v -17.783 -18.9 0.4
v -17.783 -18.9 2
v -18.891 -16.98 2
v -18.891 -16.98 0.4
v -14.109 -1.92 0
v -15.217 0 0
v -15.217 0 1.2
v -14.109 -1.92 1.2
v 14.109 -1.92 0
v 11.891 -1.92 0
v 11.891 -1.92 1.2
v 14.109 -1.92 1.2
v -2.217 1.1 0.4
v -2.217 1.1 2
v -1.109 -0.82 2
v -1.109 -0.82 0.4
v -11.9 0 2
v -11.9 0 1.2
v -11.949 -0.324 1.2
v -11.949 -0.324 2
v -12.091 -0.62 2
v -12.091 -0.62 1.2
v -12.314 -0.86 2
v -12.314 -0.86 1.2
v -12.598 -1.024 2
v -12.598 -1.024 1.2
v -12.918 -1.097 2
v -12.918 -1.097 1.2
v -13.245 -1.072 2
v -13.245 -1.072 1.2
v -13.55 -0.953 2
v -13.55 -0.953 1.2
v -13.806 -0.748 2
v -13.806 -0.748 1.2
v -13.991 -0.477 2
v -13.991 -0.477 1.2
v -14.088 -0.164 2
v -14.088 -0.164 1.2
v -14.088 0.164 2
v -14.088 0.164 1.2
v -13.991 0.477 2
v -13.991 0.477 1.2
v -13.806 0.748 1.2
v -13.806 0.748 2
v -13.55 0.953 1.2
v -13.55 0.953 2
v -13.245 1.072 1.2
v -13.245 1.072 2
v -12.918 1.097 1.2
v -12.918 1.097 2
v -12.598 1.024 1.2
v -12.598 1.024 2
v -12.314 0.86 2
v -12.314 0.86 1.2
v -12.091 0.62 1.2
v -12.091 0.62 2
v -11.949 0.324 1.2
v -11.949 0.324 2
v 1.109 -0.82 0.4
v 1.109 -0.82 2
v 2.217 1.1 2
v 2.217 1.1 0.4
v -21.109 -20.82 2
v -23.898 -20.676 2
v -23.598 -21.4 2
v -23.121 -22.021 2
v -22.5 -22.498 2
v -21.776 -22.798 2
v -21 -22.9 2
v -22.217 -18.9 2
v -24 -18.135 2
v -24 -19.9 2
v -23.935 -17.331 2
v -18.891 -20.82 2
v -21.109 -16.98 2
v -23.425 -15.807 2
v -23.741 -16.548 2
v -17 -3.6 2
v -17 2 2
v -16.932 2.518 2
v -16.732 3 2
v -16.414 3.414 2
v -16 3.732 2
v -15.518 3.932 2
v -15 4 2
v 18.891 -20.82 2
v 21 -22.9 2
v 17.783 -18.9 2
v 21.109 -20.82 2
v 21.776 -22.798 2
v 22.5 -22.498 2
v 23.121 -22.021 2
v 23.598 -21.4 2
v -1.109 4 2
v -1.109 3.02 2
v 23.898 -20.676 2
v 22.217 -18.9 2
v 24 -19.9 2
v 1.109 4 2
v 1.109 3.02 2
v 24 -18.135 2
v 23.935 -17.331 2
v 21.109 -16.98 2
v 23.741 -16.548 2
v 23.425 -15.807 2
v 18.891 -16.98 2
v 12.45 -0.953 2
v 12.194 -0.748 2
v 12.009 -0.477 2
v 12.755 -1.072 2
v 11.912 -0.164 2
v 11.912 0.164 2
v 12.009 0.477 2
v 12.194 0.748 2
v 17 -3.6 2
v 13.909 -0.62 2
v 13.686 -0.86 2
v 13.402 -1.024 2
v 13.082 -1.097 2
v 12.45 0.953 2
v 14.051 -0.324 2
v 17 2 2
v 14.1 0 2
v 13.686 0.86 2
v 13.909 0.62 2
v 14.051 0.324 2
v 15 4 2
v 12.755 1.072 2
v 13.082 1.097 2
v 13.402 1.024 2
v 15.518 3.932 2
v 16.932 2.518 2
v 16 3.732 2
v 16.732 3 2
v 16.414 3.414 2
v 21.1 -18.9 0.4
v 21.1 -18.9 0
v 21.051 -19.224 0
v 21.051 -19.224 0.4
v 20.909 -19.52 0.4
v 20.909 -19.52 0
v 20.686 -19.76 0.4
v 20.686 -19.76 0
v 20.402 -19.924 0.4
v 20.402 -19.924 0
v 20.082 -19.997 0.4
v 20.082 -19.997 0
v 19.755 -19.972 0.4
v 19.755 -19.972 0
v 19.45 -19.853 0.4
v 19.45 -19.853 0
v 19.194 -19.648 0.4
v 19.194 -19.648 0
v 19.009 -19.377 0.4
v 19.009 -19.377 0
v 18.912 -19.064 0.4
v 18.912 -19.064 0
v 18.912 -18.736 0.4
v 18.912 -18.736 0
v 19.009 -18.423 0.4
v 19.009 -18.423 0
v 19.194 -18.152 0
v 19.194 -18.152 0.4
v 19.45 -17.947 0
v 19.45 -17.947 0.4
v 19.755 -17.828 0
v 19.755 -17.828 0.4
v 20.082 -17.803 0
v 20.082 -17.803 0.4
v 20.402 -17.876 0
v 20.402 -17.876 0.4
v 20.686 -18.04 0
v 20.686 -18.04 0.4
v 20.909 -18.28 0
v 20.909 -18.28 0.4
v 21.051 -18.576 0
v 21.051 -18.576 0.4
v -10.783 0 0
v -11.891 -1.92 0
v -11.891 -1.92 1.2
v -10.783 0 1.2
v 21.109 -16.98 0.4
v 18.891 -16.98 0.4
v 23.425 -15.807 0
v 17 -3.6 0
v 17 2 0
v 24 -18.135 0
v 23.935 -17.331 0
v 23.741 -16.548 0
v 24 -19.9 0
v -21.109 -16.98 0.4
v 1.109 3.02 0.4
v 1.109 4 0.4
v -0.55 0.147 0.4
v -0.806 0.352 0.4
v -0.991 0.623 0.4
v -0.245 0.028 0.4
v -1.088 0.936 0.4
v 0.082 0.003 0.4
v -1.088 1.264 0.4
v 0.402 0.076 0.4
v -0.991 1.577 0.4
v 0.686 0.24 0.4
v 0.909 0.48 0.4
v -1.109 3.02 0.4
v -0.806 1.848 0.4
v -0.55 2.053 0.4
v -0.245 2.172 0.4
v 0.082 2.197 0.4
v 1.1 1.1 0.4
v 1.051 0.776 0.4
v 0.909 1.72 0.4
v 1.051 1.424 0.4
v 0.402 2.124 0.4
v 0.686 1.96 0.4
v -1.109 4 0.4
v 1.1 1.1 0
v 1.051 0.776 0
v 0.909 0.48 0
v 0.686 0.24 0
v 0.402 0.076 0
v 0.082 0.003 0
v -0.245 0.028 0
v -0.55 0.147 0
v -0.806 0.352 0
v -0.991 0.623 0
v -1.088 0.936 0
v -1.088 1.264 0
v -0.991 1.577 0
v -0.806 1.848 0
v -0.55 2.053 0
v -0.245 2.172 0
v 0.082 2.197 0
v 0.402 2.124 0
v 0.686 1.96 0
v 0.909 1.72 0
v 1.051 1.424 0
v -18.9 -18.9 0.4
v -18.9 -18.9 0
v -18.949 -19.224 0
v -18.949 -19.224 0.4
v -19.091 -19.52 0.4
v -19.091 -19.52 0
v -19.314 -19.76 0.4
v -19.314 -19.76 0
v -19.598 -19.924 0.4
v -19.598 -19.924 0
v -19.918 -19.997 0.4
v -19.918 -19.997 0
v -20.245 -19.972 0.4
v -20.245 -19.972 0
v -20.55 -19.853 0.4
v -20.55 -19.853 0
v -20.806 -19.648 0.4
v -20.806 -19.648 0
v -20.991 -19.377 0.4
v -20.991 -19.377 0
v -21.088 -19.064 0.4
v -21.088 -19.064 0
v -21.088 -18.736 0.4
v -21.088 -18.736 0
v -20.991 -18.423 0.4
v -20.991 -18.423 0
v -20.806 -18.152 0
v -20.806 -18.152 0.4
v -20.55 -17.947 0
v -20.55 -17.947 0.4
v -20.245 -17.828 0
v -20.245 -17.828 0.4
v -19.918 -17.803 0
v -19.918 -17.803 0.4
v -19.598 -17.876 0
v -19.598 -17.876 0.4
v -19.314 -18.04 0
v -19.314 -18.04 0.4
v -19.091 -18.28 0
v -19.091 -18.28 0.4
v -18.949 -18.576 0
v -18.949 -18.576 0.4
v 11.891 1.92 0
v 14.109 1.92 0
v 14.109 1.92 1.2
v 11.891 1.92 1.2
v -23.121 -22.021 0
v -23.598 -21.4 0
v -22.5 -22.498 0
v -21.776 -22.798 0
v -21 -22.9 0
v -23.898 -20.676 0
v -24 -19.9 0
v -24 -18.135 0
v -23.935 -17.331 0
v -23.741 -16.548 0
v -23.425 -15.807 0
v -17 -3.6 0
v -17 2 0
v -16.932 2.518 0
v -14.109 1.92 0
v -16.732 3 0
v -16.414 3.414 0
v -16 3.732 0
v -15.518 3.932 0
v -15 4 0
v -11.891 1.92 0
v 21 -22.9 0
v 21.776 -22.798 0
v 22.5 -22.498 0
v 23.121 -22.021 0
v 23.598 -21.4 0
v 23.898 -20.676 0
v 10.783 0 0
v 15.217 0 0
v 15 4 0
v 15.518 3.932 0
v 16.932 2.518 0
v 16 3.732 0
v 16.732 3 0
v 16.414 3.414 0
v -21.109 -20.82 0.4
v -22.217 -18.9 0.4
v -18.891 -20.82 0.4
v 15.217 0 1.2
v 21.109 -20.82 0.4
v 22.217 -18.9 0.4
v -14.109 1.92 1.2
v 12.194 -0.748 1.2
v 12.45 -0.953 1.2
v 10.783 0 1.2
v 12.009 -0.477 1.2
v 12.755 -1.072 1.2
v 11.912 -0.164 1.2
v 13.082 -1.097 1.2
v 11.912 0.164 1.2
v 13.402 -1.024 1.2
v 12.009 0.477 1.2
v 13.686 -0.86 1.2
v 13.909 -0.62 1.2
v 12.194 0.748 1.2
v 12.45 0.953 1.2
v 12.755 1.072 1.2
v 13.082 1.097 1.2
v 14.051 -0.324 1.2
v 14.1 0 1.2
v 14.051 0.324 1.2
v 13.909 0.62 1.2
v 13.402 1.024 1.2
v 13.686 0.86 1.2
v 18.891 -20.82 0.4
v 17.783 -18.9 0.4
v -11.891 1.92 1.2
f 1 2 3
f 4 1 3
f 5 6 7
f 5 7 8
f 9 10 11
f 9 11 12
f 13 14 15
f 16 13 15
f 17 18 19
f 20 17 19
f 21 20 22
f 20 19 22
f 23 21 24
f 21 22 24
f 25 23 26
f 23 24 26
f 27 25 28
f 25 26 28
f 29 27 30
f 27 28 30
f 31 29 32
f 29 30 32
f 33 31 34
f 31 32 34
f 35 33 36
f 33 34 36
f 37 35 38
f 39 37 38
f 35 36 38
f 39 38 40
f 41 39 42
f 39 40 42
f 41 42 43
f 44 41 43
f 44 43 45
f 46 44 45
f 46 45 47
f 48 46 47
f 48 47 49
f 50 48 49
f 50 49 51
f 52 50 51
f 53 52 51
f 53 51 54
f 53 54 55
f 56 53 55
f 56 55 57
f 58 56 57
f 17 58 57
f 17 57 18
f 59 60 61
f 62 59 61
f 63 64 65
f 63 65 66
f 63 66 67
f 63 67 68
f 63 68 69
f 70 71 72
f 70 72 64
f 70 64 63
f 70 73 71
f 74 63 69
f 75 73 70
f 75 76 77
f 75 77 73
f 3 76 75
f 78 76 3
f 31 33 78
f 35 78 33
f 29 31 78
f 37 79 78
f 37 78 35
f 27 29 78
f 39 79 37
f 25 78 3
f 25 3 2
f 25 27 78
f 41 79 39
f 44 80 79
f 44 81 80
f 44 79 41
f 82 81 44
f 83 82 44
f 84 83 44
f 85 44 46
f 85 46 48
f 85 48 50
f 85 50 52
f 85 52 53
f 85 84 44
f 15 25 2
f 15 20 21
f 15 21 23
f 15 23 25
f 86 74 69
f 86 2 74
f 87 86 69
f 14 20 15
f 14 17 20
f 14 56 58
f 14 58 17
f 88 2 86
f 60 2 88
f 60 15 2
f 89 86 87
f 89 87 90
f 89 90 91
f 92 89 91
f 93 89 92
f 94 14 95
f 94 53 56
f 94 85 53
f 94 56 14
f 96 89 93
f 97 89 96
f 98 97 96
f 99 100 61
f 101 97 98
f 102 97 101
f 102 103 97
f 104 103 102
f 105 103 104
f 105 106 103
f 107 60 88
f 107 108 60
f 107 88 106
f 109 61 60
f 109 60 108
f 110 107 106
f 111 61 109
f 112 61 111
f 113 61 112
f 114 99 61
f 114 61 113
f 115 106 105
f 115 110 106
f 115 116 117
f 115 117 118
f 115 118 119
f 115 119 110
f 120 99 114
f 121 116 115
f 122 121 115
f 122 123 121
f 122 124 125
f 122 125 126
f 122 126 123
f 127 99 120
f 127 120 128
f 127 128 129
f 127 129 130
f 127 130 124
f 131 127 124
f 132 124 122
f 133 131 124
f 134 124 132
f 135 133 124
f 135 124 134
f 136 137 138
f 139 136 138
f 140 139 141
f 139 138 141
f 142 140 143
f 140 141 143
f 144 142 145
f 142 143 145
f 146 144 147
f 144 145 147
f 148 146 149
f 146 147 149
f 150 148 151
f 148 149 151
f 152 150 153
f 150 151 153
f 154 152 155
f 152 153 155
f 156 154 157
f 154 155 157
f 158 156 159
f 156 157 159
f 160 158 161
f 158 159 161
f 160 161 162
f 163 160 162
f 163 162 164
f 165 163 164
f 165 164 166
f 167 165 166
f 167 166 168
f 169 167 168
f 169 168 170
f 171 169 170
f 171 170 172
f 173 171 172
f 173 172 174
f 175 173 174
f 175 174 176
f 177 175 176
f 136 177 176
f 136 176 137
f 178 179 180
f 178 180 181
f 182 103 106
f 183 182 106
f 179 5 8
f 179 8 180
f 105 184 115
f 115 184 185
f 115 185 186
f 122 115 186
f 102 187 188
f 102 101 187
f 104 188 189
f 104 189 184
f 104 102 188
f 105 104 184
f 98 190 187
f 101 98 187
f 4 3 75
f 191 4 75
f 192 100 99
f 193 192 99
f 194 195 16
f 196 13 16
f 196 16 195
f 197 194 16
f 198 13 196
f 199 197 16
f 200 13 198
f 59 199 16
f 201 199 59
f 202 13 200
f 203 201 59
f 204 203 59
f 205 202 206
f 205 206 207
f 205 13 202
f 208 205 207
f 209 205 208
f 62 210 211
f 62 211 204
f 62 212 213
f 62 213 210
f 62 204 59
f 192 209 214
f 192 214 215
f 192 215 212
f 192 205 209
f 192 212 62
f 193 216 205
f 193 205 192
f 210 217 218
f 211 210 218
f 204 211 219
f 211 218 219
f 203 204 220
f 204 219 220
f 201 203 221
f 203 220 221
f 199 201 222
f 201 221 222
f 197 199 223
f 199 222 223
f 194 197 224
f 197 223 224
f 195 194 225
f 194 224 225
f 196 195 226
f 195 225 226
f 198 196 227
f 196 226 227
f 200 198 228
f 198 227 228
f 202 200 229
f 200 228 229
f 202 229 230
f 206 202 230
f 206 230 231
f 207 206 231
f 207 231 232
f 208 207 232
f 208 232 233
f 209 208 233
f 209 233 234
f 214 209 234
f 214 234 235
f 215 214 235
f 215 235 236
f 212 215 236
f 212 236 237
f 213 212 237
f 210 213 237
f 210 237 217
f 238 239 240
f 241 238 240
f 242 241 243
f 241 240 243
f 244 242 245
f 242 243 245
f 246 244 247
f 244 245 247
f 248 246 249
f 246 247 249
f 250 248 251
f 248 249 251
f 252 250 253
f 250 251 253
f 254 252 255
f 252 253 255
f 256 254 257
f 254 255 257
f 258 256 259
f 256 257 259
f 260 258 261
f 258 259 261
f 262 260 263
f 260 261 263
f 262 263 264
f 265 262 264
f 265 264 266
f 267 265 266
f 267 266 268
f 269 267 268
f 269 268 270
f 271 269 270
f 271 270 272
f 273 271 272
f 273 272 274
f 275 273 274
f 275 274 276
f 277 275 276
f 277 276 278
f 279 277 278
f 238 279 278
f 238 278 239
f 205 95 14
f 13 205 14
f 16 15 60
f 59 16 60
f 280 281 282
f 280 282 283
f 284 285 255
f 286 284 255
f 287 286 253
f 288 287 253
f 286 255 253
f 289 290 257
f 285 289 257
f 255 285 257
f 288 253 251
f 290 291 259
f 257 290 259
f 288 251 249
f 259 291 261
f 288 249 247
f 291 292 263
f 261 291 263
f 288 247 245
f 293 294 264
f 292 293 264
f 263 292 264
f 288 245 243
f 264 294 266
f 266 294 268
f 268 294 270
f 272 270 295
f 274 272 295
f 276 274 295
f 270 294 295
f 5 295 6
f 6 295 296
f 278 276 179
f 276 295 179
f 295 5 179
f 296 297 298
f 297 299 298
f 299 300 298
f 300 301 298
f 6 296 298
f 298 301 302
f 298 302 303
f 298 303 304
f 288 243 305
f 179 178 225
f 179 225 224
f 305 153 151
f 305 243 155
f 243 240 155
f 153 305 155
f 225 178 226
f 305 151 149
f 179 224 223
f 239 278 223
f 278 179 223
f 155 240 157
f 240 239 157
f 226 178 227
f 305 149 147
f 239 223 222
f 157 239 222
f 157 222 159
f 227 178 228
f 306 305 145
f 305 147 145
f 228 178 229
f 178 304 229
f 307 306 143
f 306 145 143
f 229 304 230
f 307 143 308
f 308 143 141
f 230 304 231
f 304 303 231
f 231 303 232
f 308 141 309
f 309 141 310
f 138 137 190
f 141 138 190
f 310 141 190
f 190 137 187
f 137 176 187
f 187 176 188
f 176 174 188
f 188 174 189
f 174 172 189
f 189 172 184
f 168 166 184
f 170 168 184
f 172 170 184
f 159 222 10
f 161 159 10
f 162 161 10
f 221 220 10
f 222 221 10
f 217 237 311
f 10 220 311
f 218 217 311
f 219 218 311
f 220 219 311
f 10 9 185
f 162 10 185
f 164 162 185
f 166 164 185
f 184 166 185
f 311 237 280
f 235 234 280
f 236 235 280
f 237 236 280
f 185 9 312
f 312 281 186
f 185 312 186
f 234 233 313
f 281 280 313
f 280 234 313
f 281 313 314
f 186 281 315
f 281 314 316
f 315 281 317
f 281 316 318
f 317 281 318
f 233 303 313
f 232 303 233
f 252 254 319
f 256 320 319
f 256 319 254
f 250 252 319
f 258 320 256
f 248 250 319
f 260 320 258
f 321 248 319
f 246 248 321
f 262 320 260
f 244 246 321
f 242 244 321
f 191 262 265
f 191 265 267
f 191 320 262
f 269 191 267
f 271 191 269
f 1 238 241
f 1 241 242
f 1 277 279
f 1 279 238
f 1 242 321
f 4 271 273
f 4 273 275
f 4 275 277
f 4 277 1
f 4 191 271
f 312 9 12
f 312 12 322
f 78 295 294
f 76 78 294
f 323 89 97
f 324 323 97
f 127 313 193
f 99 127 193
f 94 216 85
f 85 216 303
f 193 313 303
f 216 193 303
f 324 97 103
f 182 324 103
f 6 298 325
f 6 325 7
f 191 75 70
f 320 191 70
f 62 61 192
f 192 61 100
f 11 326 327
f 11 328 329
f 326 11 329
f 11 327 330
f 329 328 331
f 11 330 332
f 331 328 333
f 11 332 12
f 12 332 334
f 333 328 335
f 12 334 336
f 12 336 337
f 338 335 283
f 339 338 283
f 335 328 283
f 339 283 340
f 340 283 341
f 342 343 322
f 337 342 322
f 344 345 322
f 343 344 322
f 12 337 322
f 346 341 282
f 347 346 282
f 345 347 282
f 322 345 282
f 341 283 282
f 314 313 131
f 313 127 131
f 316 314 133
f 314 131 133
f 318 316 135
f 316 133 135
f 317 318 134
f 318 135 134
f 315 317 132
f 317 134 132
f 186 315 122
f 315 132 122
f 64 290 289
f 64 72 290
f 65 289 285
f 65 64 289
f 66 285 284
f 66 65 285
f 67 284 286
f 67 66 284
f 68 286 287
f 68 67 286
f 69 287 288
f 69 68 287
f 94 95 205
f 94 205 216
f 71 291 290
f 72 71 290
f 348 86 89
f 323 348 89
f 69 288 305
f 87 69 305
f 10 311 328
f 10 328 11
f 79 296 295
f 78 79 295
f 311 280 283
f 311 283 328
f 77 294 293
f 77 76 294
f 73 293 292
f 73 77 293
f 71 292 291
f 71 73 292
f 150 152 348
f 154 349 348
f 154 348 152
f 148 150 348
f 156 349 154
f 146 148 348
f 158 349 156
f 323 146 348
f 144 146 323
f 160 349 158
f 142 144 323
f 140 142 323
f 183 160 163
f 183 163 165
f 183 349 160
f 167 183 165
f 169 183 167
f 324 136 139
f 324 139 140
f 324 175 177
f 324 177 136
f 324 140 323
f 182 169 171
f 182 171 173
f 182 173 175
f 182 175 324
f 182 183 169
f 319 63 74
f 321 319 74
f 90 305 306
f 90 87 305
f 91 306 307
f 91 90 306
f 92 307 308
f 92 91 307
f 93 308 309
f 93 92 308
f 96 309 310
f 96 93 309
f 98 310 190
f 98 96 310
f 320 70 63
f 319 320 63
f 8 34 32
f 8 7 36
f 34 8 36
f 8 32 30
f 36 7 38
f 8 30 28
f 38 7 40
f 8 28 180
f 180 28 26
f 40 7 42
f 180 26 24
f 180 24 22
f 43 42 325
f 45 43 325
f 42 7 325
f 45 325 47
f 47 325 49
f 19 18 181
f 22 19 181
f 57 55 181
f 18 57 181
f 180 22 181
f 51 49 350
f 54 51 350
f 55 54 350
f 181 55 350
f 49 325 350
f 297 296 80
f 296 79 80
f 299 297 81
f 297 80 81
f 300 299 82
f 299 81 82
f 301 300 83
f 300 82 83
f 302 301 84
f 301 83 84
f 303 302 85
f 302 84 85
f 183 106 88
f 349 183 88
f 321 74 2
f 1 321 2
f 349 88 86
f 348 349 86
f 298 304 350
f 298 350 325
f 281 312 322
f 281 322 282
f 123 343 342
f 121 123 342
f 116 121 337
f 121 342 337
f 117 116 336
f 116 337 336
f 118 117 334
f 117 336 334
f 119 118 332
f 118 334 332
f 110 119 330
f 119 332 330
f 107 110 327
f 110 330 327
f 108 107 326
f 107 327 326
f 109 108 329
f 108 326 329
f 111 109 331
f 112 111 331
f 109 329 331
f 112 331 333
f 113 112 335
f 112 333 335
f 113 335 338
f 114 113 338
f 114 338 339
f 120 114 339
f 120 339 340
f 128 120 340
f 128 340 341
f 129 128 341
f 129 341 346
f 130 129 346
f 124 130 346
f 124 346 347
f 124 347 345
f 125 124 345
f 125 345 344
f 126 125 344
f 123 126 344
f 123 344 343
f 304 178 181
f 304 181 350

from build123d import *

# Parameters (mm, degrees)
F2_DEPTH = 2
F3_R     = 1.1
F4_DEPTH = 2
F6_DEPTH = 1.2
F7_W     = 2.2170250337
F7_H     = 0.98
F8_DEPTH = 1.6
F9_R     = 2
F10_R    = 5
F11_R    = 3


with BuildPart() as f2:
    # F1 (on Top) → F2 (new body)
    with BuildSketch(Plane.XY):
        Polygon((0, 4), (-3, 4), (-13, 4), (-17, 4), (-17, -3.6), (-24, -16.9), (-24, -22.9), (0, -22.9), (24, -22.9), (24, -16.9), (17, -3.6), (17, 4), (13, 4), (3, 4), align=None)
    extrude(amount=F2_DEPTH)

    # F3 (on face) → F4 (cut, through all)
    with BuildSketch(Plane(origin=(0, 0, 0), x_dir=(1, 0, 0), z_dir=(0, 0, -1))):
        with Locations((20, 18.9)):
            Circle(F3_R)
        with Locations((13, 0)):
            Circle(F3_R)
        with Locations((0, -1.1)):
            Circle(F3_R)
        with Locations((-13, 0)):
            Circle(F3_R)
        with Locations((-20, 18.9)):
            Circle(F3_R)
    extrude(amount=-F4_DEPTH, mode=Mode.SUBTRACT)

    # F5 (on Top) → F6 (cut)
    with BuildSketch(Plane.XY):
        Polygon((10.7829749663, 0), (11.8914874832, -1.92), (14.1085125168, -1.92), (15.2170250337, 0), (14.1085125168, 1.92), (11.8914874832, 1.92), align=None)
        Polygon((-14.1085125168, -1.92), (-11.8914874832, -1.92), (-10.7829749663, 0), (-11.8914874832, 1.92), (-14.1085125168, 1.92), (-15.2170250337, 0), align=None)
    extrude(amount=F6_DEPTH, mode=Mode.SUBTRACT)

    # F7 (on face) → F8 (cut)
    with BuildSketch(Plane.XY.offset(2)):
        Polygon((-17.7829749663, -18.9), (-18.8914874832, -16.98), (-21.1085125168, -16.98), (-22.2170250337, -18.9), (-21.1085125168, -20.82), (-18.8914874832, -20.82), align=None)
        with Locations((0, 3.51)):
            Rectangle(F7_W, F7_H)
        Polygon((1.1085125168, 3.02), (-1.1085125168, 3.02), (-2.2170250337, 1.1), (-1.1085125168, -0.82), (1.1085125168, -0.82), (2.2170250337, 1.1), align=None)
        Polygon((18.8914874832, -16.98), (17.7829749663, -18.9), (18.8914874832, -20.82), (21.1085125168, -20.82), (22.2170250337, -18.9), (21.1085125168, -16.98), align=None)
    extrude(amount=-F8_DEPTH, mode=Mode.SUBTRACT)

    # F9
    f9_edges = [f2.edges().sort_by_distance(p)[0] for p in [
        (-17, 4, 1),
        (17, 4, 1),
    ]]
    fillet(f9_edges, radius=F9_R)

    # F10
    f10_edges = [f2.edges().sort_by_distance(p)[0] for p in [
        (24, -16.9, 1),
        (-24, -16.9, 1),
    ]]
    fillet(f10_edges, radius=F10_R)

    # F11
    f11_edges = [f2.edges().sort_by_distance(p)[0] for p in [
        (24, -22.9, 1),
        (-24, -22.9, 1),
    ]]
    fillet(f11_edges, radius=F11_R)


solid = f2.part
